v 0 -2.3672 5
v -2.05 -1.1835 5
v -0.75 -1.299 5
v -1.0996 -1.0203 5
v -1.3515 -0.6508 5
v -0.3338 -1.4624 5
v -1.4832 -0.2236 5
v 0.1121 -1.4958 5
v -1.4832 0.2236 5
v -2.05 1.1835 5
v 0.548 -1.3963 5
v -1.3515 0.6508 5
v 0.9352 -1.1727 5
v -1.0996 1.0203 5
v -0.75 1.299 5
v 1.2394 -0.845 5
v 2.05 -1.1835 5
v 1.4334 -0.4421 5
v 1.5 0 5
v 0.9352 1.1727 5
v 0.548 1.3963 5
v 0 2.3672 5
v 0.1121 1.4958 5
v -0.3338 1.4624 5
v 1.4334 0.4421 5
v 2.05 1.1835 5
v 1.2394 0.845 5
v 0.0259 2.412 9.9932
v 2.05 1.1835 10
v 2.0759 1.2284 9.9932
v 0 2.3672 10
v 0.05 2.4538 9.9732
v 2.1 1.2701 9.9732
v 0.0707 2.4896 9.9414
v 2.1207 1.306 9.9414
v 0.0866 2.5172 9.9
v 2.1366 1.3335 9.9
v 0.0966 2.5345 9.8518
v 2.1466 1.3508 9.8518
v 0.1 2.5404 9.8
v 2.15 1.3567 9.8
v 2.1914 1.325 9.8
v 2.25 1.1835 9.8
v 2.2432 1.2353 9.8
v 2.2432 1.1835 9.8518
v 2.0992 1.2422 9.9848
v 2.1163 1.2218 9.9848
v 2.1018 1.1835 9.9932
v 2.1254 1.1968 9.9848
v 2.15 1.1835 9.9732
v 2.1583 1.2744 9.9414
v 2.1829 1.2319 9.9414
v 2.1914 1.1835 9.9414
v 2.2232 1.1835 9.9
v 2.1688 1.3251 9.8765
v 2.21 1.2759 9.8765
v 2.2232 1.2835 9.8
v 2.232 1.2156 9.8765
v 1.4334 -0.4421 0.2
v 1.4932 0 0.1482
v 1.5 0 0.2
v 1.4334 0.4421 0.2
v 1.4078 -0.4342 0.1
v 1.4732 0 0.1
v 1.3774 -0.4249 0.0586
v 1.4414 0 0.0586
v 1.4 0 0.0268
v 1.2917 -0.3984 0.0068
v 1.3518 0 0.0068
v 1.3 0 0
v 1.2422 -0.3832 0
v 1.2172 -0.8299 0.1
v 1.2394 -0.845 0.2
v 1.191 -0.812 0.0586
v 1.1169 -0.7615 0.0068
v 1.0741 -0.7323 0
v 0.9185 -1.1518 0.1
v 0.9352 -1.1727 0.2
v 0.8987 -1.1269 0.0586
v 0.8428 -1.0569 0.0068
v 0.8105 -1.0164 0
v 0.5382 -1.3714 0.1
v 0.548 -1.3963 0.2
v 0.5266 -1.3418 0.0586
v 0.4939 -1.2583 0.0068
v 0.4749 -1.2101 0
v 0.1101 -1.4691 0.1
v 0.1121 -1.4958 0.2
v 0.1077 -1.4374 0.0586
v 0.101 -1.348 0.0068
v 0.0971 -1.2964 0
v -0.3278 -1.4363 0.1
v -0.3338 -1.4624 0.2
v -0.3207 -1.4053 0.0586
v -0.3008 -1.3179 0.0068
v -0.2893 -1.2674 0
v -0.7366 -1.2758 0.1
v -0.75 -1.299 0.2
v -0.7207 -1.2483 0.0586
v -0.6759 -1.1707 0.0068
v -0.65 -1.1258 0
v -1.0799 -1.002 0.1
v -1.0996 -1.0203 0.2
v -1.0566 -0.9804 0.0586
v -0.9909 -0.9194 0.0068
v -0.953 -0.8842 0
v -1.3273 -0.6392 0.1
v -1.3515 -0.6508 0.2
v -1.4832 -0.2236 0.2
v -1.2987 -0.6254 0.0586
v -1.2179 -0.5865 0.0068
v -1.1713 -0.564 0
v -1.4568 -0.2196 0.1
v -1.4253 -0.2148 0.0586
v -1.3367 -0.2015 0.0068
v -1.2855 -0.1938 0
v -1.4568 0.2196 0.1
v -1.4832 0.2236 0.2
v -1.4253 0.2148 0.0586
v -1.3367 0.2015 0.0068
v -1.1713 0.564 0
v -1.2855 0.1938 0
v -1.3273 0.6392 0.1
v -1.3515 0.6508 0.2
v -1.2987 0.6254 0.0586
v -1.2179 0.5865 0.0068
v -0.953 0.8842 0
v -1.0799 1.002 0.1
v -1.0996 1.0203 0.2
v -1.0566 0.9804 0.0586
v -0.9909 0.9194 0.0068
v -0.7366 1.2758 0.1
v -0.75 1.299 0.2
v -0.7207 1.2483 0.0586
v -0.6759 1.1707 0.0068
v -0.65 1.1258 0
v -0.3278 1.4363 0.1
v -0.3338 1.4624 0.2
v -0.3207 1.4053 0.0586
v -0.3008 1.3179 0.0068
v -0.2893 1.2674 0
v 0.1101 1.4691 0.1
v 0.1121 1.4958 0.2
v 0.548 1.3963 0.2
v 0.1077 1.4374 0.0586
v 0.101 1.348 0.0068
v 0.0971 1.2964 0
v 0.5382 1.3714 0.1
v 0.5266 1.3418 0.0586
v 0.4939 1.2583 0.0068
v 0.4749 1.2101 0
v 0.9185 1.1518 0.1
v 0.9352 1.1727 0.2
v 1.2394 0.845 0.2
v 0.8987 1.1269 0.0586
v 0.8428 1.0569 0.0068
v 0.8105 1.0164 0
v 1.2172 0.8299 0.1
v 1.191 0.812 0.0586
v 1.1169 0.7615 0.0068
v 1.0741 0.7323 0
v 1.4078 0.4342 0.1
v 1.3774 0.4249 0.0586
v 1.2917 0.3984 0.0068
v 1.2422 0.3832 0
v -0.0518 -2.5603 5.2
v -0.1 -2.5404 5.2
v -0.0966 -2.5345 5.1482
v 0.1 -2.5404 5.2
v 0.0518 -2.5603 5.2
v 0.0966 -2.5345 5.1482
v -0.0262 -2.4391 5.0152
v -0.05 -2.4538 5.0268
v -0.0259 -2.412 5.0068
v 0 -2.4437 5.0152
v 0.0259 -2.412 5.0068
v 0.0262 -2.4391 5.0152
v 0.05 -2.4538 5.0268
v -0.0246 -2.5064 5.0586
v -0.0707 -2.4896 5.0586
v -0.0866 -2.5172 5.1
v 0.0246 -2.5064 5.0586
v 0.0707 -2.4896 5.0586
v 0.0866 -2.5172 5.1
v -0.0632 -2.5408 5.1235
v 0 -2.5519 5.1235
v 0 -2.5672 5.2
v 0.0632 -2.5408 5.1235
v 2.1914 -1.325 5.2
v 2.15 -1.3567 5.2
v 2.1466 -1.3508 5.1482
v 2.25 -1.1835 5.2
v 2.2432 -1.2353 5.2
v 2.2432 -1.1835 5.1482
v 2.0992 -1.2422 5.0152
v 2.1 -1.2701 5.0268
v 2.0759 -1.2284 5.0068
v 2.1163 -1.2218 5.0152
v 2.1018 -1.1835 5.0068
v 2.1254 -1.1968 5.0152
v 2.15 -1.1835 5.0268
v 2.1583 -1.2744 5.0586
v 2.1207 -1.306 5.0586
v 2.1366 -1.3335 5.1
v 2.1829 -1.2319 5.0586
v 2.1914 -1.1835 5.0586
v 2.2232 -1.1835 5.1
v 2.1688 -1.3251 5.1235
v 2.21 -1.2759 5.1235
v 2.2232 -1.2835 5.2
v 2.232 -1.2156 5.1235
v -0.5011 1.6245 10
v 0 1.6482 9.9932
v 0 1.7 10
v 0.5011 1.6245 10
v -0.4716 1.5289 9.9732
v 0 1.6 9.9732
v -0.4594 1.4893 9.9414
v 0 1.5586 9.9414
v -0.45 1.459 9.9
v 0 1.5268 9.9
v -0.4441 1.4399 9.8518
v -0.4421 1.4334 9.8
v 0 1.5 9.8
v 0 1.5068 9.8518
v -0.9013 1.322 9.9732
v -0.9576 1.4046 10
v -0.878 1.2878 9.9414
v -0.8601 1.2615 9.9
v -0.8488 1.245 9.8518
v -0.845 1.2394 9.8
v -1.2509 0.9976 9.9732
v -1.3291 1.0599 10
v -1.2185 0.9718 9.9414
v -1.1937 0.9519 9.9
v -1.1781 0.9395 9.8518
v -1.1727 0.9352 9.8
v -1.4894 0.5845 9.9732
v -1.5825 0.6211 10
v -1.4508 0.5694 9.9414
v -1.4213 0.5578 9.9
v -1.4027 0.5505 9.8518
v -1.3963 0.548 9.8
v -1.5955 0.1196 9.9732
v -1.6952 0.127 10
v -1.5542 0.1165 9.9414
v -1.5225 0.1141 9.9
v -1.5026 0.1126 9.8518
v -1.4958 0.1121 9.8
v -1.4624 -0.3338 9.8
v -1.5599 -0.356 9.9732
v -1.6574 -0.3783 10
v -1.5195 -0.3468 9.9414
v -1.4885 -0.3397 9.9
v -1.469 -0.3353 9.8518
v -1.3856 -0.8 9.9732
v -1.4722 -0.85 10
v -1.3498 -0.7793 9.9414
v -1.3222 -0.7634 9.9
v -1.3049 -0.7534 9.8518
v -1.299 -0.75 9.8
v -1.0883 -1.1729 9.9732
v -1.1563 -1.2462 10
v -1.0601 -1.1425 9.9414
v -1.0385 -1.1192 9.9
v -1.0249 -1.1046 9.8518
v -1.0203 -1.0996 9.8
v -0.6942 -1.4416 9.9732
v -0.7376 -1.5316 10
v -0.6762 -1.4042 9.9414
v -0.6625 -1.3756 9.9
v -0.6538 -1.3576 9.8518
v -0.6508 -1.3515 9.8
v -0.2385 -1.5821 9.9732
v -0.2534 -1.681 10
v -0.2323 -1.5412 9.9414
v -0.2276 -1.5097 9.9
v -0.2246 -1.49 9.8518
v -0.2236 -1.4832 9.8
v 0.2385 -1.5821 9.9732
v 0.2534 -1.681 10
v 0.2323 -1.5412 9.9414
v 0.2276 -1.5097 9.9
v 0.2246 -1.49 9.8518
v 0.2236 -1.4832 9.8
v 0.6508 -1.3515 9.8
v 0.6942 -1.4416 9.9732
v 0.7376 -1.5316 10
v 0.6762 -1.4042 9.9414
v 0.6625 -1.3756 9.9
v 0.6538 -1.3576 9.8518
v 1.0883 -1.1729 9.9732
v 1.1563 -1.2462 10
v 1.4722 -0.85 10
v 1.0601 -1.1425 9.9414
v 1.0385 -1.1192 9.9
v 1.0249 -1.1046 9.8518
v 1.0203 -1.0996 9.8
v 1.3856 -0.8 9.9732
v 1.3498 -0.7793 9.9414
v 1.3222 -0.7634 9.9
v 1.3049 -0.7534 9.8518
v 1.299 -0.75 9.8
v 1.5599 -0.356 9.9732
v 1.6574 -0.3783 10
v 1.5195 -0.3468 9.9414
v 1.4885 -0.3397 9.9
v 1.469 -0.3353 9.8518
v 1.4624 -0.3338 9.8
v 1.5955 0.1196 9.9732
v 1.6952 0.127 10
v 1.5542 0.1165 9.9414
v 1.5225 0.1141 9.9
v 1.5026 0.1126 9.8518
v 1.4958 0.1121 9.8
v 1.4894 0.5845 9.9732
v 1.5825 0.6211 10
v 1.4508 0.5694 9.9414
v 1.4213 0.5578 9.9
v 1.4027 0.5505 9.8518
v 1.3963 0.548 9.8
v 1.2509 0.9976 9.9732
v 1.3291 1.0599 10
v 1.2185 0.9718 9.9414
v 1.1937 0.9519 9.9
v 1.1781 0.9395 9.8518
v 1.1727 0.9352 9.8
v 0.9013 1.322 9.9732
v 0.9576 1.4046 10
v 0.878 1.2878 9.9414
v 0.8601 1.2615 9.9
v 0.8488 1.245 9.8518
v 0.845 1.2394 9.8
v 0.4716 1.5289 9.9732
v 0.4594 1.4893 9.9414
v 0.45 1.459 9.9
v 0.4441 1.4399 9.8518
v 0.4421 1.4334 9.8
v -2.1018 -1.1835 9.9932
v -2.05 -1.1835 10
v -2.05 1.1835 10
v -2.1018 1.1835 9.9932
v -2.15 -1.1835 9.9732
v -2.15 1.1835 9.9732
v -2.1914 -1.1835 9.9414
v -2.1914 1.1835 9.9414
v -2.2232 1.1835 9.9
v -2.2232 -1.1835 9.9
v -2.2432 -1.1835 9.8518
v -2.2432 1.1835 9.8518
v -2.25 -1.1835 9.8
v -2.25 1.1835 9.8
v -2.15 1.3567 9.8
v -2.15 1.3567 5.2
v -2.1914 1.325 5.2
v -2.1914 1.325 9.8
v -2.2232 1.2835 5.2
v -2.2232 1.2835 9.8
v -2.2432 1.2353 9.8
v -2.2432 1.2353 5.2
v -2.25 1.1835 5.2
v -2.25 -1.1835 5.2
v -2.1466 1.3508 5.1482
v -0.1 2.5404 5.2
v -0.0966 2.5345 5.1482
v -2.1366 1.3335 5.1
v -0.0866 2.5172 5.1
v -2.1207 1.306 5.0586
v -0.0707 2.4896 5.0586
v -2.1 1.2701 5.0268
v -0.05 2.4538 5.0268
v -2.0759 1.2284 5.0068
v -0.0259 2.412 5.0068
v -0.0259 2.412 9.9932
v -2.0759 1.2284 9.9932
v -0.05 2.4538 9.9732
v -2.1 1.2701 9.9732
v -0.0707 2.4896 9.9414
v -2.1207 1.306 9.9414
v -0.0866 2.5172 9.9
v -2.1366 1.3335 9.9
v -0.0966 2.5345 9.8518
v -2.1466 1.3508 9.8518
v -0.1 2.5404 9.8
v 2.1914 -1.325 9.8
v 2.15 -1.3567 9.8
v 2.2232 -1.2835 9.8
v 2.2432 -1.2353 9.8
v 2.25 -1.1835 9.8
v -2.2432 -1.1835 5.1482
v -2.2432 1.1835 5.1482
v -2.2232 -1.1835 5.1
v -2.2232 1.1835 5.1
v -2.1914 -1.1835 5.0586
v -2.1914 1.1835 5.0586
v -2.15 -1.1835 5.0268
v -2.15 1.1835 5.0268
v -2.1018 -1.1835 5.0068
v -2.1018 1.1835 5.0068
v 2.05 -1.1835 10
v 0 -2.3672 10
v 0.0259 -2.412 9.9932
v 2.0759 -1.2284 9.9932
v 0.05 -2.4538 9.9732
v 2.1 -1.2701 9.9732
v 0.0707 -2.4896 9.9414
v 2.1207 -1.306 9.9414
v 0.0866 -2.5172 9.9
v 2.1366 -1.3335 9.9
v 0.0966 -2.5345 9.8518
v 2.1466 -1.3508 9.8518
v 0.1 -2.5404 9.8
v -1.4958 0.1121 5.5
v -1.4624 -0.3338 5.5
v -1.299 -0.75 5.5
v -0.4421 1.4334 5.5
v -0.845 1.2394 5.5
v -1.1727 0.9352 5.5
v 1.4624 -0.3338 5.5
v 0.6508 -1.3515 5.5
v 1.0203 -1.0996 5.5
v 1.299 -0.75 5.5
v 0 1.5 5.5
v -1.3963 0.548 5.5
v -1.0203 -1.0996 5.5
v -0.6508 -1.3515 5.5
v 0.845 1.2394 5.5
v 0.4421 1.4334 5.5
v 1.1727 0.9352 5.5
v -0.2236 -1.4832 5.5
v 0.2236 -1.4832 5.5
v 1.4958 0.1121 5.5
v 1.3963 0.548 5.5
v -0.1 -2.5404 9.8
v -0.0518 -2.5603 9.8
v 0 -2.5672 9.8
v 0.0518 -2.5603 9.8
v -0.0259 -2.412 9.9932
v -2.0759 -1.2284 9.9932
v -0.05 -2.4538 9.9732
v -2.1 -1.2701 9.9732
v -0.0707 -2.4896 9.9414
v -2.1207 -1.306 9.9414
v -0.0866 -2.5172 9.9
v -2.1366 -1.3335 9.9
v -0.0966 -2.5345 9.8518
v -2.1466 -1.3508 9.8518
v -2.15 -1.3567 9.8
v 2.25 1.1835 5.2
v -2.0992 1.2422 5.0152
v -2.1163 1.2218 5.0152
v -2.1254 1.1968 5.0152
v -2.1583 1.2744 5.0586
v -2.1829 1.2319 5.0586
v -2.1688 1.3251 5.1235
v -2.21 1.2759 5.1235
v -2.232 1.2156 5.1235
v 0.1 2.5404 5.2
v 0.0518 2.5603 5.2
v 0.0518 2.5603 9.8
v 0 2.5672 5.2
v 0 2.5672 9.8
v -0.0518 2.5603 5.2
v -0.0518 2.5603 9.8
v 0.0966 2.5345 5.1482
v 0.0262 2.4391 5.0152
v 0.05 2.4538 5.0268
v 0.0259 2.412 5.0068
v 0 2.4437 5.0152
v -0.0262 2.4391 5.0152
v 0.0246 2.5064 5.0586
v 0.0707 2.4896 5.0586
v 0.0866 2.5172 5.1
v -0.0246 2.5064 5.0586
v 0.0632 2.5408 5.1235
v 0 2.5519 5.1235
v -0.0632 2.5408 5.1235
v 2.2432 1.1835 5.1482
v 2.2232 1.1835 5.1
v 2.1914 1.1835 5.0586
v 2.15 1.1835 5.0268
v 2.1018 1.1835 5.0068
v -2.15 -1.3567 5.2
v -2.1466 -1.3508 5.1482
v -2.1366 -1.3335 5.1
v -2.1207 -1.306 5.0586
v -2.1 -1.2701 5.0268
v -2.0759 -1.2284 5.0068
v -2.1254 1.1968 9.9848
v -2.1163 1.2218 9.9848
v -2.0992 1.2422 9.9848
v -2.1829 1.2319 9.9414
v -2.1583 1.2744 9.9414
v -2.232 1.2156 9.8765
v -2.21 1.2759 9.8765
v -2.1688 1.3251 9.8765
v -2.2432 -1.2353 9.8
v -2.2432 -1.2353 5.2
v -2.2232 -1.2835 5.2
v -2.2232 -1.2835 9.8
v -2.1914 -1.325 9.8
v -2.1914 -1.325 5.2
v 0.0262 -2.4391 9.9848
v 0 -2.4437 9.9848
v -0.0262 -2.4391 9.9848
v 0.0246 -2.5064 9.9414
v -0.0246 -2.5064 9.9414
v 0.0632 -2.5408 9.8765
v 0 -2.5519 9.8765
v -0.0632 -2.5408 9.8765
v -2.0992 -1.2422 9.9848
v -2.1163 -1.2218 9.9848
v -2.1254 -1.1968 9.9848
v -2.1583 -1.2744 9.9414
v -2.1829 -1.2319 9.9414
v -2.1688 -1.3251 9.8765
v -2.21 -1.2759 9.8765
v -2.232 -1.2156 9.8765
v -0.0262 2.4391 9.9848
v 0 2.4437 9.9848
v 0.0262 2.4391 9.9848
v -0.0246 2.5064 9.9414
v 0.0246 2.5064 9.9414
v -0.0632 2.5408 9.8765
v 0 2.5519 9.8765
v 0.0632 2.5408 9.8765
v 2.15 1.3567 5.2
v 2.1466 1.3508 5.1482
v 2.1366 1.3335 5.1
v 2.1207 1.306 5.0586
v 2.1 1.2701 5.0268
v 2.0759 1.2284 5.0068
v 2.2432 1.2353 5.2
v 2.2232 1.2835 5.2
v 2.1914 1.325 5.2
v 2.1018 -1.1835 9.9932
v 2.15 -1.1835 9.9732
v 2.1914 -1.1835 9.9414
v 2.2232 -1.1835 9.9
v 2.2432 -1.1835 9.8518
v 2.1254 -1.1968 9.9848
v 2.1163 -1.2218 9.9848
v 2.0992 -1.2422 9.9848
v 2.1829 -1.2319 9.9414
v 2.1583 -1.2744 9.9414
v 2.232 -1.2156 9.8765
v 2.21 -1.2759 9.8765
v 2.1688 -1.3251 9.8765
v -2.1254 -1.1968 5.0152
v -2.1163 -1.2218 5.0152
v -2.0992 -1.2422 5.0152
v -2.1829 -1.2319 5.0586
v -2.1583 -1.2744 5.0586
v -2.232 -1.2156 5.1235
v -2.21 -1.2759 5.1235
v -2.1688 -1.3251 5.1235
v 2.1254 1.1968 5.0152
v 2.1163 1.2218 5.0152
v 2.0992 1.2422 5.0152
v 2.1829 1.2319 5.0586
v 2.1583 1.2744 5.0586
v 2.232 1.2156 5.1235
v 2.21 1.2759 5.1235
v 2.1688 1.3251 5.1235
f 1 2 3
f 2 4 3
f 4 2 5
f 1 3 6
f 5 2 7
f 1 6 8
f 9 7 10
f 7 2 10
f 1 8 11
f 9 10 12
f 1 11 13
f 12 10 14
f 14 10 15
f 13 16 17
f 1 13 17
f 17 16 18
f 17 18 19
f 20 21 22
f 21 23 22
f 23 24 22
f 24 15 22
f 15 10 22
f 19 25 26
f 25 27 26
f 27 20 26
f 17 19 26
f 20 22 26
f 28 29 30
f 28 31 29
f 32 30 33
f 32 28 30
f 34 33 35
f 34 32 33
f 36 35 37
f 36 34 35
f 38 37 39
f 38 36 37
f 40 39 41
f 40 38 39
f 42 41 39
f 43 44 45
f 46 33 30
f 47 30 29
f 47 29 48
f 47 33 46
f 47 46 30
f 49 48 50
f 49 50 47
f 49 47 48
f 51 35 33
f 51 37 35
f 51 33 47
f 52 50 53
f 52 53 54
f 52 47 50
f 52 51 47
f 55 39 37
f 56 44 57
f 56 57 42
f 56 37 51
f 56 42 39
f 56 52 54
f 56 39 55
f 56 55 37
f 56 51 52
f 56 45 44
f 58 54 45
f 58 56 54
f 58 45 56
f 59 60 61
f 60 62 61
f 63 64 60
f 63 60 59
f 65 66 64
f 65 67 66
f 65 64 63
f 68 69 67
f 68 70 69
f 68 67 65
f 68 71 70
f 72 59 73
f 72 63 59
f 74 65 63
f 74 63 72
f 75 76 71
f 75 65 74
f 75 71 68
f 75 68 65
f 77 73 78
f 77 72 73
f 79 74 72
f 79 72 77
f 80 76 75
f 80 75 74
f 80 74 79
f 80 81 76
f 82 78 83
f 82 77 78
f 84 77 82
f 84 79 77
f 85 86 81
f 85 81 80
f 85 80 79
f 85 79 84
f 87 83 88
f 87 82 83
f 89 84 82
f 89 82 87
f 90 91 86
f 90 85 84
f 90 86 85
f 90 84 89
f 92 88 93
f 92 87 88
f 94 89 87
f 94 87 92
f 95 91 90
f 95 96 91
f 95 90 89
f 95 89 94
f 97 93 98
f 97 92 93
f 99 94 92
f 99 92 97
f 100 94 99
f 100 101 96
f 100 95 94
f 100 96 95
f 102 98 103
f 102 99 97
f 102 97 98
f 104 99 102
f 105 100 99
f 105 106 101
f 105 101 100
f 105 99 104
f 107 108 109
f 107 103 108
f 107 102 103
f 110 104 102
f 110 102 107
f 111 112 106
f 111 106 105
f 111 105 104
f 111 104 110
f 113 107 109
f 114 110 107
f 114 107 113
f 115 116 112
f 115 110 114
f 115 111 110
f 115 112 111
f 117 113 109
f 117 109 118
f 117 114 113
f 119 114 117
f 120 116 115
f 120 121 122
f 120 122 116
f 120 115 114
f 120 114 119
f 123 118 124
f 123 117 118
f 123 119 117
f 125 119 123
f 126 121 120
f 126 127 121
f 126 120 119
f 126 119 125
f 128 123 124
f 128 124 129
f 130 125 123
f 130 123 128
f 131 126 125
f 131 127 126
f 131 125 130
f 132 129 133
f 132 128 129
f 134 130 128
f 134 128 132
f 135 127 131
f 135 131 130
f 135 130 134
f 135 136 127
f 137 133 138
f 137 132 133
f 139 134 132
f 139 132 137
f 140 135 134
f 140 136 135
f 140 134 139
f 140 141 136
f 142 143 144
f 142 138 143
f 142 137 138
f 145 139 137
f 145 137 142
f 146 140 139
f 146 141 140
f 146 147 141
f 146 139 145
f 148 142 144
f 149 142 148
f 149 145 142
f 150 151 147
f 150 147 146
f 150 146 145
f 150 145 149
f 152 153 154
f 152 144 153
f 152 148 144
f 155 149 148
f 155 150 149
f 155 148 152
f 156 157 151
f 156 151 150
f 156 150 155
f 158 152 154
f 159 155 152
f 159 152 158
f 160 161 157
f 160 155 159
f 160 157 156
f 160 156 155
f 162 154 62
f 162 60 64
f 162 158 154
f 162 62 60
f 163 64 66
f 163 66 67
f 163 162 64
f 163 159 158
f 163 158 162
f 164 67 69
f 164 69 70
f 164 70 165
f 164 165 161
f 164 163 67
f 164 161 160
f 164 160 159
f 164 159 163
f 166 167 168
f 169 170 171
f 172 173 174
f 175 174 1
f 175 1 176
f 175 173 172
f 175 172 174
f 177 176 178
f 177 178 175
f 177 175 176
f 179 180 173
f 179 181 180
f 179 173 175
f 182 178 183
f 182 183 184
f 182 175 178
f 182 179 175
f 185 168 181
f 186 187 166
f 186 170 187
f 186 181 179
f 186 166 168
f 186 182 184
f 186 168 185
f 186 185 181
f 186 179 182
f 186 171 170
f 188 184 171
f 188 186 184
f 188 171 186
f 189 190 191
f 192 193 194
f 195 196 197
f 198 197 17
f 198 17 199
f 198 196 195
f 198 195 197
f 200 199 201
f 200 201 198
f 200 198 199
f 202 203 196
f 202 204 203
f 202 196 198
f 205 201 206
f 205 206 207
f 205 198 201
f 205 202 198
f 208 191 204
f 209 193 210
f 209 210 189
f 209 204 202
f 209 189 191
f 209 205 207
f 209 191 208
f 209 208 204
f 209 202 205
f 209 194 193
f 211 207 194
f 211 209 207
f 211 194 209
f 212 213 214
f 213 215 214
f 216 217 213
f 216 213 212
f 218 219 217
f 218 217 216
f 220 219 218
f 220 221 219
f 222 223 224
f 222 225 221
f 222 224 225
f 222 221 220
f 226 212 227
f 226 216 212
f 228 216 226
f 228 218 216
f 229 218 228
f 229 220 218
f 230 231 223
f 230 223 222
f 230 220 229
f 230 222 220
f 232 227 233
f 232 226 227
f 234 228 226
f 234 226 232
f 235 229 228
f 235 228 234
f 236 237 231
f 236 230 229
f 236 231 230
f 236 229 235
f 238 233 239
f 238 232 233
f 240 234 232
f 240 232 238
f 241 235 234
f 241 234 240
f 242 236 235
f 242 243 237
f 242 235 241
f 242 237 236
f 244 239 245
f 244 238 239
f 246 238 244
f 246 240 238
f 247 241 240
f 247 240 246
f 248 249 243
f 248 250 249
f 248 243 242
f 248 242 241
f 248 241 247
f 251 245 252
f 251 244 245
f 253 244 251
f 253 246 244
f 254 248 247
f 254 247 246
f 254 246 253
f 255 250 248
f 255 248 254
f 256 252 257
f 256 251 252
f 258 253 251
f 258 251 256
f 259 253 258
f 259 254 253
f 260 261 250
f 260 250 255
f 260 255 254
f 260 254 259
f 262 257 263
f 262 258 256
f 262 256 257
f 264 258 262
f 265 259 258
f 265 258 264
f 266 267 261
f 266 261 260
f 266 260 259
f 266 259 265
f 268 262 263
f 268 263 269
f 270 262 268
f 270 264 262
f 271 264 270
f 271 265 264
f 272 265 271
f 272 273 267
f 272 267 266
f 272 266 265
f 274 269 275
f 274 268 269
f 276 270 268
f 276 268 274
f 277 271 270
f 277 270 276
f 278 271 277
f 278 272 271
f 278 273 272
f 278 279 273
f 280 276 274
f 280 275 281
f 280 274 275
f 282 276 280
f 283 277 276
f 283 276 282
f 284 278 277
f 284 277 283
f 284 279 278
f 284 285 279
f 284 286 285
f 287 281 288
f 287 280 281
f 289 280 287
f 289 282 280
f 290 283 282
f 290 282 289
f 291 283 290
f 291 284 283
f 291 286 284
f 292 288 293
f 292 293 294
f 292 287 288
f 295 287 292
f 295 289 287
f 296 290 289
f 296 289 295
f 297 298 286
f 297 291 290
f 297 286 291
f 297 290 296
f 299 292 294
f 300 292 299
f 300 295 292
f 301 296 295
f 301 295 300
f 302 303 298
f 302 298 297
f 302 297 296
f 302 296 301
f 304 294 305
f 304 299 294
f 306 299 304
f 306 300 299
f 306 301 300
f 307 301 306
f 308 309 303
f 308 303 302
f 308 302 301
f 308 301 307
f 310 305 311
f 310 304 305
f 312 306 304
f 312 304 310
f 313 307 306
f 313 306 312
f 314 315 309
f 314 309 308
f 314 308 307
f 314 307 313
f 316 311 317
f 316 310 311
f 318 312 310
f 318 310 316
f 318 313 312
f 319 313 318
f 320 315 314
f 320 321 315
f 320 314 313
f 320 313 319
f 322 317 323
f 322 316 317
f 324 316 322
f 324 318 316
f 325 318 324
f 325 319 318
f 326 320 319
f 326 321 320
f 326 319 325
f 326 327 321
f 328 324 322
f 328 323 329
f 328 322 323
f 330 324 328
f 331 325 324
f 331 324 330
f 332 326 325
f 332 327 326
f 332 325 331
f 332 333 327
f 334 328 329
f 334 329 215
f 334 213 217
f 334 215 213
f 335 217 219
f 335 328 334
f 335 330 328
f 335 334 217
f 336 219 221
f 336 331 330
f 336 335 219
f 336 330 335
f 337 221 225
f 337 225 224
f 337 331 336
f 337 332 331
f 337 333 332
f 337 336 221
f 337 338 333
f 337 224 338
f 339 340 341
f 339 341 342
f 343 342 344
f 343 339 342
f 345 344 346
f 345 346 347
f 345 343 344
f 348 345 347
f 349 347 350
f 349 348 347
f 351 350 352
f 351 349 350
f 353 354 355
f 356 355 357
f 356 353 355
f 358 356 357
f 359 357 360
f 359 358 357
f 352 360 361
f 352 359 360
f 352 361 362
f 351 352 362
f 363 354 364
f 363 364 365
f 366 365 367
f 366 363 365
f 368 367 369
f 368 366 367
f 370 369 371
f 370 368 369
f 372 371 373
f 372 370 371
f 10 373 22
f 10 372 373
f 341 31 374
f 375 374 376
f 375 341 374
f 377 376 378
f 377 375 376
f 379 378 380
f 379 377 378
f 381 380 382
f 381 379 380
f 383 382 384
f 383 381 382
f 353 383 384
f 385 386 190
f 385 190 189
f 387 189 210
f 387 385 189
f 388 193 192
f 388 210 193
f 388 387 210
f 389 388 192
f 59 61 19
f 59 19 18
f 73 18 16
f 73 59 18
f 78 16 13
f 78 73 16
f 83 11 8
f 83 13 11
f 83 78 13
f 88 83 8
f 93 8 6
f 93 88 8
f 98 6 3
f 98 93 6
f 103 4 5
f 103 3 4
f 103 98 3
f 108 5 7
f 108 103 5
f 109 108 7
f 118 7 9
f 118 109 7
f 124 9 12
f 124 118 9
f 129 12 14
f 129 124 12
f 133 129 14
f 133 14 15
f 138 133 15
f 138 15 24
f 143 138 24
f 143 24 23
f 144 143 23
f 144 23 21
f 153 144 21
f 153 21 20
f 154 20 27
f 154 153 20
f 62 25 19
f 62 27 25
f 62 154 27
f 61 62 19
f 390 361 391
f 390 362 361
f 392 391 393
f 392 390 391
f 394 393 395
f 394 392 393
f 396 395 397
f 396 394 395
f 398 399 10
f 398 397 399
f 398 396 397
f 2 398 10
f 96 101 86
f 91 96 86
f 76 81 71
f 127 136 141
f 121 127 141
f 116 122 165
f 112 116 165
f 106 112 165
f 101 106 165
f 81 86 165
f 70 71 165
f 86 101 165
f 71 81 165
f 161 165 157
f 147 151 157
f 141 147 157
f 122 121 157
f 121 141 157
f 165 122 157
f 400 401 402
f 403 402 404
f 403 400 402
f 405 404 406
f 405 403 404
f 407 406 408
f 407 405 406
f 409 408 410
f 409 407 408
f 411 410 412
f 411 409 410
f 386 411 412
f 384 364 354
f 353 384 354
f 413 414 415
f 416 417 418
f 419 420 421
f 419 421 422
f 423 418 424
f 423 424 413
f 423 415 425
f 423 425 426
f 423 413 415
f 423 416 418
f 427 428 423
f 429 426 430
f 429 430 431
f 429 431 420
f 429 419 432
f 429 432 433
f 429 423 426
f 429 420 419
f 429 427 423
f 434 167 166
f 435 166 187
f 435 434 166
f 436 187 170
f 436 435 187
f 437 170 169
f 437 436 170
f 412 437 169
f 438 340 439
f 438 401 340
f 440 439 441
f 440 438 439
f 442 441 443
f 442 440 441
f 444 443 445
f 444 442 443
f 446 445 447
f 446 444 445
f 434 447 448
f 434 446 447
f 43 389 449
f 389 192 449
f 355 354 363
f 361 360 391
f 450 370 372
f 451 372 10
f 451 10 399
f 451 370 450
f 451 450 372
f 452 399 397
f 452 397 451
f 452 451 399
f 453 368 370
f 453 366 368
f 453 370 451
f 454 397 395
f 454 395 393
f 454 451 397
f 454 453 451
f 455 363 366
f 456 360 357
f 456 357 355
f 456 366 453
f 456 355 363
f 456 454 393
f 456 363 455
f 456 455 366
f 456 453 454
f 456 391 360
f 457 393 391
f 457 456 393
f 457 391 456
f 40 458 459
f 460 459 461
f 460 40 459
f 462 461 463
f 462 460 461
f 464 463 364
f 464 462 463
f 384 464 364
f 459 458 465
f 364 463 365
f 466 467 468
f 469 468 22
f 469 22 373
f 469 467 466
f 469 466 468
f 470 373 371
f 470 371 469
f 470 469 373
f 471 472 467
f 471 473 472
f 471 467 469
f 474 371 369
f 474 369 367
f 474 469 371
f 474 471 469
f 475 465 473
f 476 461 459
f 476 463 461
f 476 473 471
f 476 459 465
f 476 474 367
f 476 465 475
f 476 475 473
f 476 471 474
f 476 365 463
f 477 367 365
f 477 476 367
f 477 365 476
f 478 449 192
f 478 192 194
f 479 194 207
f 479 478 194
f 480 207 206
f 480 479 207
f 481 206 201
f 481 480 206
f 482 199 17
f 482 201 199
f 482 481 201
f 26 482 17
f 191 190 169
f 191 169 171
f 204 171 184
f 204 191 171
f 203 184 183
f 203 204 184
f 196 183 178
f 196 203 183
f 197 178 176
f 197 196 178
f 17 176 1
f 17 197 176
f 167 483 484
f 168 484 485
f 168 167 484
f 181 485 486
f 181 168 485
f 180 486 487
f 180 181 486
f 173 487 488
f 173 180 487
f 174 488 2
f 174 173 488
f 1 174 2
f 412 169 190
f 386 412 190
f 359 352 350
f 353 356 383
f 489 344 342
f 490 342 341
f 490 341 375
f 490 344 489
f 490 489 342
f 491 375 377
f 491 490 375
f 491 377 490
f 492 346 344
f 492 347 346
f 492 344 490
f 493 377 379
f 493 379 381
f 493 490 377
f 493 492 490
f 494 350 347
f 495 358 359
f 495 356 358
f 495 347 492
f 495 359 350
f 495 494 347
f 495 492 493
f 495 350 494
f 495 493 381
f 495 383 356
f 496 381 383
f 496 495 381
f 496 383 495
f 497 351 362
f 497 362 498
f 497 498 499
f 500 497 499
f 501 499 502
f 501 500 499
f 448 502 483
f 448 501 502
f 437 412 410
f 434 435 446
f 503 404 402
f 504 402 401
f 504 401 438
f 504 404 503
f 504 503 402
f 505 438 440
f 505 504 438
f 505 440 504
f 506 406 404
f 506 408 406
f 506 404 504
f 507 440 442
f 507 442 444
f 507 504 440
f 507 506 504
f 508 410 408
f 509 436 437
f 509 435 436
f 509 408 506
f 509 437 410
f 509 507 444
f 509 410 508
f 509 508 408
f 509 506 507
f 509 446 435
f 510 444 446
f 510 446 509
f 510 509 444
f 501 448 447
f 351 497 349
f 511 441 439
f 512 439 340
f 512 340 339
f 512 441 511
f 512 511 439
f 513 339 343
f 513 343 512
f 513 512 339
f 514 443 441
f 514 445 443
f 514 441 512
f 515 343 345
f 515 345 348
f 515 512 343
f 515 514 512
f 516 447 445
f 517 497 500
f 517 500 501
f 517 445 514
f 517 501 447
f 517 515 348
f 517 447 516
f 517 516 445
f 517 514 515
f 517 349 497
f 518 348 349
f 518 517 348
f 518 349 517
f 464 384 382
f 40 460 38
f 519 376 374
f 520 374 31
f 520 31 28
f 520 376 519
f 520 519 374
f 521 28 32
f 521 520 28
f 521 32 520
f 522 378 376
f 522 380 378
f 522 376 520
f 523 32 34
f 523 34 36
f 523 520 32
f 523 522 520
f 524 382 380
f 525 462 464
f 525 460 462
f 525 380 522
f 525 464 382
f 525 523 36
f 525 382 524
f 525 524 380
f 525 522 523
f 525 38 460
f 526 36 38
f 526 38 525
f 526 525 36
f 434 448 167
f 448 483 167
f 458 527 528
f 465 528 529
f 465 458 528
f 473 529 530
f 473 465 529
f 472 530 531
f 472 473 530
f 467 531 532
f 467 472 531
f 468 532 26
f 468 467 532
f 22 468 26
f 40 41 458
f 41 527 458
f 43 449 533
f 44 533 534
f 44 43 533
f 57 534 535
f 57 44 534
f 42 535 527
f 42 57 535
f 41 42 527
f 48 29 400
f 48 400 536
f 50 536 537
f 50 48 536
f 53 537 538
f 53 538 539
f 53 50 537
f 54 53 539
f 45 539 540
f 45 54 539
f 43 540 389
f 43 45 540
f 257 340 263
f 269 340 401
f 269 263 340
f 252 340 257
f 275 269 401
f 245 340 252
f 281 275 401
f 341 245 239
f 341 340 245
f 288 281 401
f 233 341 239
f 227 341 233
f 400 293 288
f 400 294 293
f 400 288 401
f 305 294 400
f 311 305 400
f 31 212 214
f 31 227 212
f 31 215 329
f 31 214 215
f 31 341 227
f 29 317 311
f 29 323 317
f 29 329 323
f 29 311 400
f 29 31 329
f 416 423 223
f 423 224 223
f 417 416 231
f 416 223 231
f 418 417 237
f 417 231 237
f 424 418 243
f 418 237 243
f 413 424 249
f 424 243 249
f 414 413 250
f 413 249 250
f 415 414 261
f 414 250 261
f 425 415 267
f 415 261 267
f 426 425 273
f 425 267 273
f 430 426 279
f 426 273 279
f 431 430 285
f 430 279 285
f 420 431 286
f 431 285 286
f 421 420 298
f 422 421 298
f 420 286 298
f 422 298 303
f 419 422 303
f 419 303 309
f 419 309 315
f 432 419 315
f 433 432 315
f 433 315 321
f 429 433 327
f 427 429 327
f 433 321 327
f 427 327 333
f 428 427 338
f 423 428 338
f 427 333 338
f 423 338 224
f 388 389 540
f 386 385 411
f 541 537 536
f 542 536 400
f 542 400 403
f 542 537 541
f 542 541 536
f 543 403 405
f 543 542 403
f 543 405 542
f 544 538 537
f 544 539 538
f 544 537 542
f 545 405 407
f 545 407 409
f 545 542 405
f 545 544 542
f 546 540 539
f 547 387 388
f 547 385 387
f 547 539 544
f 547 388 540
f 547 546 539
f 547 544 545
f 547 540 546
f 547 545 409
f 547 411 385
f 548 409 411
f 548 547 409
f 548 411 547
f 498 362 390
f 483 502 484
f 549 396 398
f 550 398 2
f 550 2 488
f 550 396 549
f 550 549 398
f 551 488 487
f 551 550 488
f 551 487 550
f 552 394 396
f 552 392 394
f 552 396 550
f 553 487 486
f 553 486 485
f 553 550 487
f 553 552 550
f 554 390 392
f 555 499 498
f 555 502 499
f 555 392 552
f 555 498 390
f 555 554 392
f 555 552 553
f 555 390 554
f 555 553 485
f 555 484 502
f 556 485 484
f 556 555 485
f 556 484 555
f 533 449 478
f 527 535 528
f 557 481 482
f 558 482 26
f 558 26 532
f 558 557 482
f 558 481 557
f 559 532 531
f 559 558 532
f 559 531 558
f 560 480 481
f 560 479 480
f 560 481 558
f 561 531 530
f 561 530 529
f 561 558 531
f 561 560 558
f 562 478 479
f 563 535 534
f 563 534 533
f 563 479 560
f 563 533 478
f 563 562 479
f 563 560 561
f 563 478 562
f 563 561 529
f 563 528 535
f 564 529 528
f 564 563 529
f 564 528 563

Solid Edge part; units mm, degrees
sketch "Sketch1" plane through (0, 0, 0) normal (0, 0, 1) x (1, 0, 0)
  circle A0 centre (0, 0) radius 1.5
extrude "Protrusion1" add sketch "Sketch1" along normal blind 5
sketch "Sketch2" plane through (0, 0, 5) normal (0, 0, 1) x (1, 0, 0)
  line L0 (2.25, 1.299) -> (0, 2.5981)
  line L1 (0, 2.5981) -> (-2.25, 1.299)
  line L2 (-2.25, 1.299) -> (-2.25, -1.299)
  line L3 (-2.25, -1.299) -> (0, -2.5981)
  line L4 (0, -2.5981) -> (2.25, -1.299)
  line L5 (2.25, -1.299) -> (2.25, 1.299)
extrude "ExtrudedProtrusion_2" add sketch "Sketch2" along normal blind 5
sketch "Sketch3" plane through (0, 0, 10) normal (0, 0, 1) x (0, 1, 0)
  circle A0 centre (0, 0) radius 1.5
extrude "ExtrudedCutout_1" cut sketch "Sketch3" against normal blind 4.5
fillet "Round_1" radius 0.2 20 edges at (2.25, -1.299, 7.5) (2.25, 1.299, 7.5) (2.25, 0, 10) (1.125, 1.9486, 10) (0, -1.5, 10) (0, 2.5981, 7.5) (1.125, 1.9486, 5) (2.25, 0, 5) (1.125, -1.9486, 5) (0, -2.5981, 7.5) (1.125, -1.9486, 10) (-1.125, -1.9486, 10) (-1.125, -1.9486, 5) (-2.25, -1.299, 7.5) (-2.25, 0, 10) (-1.125, 1.9486, 10) (-2.25, 1.299, 7.5) (-2.25, 0, 5) (-1.125, 1.9486, 5) (-1.5, 0, 0)
properties material "Brass, yellow brass"
